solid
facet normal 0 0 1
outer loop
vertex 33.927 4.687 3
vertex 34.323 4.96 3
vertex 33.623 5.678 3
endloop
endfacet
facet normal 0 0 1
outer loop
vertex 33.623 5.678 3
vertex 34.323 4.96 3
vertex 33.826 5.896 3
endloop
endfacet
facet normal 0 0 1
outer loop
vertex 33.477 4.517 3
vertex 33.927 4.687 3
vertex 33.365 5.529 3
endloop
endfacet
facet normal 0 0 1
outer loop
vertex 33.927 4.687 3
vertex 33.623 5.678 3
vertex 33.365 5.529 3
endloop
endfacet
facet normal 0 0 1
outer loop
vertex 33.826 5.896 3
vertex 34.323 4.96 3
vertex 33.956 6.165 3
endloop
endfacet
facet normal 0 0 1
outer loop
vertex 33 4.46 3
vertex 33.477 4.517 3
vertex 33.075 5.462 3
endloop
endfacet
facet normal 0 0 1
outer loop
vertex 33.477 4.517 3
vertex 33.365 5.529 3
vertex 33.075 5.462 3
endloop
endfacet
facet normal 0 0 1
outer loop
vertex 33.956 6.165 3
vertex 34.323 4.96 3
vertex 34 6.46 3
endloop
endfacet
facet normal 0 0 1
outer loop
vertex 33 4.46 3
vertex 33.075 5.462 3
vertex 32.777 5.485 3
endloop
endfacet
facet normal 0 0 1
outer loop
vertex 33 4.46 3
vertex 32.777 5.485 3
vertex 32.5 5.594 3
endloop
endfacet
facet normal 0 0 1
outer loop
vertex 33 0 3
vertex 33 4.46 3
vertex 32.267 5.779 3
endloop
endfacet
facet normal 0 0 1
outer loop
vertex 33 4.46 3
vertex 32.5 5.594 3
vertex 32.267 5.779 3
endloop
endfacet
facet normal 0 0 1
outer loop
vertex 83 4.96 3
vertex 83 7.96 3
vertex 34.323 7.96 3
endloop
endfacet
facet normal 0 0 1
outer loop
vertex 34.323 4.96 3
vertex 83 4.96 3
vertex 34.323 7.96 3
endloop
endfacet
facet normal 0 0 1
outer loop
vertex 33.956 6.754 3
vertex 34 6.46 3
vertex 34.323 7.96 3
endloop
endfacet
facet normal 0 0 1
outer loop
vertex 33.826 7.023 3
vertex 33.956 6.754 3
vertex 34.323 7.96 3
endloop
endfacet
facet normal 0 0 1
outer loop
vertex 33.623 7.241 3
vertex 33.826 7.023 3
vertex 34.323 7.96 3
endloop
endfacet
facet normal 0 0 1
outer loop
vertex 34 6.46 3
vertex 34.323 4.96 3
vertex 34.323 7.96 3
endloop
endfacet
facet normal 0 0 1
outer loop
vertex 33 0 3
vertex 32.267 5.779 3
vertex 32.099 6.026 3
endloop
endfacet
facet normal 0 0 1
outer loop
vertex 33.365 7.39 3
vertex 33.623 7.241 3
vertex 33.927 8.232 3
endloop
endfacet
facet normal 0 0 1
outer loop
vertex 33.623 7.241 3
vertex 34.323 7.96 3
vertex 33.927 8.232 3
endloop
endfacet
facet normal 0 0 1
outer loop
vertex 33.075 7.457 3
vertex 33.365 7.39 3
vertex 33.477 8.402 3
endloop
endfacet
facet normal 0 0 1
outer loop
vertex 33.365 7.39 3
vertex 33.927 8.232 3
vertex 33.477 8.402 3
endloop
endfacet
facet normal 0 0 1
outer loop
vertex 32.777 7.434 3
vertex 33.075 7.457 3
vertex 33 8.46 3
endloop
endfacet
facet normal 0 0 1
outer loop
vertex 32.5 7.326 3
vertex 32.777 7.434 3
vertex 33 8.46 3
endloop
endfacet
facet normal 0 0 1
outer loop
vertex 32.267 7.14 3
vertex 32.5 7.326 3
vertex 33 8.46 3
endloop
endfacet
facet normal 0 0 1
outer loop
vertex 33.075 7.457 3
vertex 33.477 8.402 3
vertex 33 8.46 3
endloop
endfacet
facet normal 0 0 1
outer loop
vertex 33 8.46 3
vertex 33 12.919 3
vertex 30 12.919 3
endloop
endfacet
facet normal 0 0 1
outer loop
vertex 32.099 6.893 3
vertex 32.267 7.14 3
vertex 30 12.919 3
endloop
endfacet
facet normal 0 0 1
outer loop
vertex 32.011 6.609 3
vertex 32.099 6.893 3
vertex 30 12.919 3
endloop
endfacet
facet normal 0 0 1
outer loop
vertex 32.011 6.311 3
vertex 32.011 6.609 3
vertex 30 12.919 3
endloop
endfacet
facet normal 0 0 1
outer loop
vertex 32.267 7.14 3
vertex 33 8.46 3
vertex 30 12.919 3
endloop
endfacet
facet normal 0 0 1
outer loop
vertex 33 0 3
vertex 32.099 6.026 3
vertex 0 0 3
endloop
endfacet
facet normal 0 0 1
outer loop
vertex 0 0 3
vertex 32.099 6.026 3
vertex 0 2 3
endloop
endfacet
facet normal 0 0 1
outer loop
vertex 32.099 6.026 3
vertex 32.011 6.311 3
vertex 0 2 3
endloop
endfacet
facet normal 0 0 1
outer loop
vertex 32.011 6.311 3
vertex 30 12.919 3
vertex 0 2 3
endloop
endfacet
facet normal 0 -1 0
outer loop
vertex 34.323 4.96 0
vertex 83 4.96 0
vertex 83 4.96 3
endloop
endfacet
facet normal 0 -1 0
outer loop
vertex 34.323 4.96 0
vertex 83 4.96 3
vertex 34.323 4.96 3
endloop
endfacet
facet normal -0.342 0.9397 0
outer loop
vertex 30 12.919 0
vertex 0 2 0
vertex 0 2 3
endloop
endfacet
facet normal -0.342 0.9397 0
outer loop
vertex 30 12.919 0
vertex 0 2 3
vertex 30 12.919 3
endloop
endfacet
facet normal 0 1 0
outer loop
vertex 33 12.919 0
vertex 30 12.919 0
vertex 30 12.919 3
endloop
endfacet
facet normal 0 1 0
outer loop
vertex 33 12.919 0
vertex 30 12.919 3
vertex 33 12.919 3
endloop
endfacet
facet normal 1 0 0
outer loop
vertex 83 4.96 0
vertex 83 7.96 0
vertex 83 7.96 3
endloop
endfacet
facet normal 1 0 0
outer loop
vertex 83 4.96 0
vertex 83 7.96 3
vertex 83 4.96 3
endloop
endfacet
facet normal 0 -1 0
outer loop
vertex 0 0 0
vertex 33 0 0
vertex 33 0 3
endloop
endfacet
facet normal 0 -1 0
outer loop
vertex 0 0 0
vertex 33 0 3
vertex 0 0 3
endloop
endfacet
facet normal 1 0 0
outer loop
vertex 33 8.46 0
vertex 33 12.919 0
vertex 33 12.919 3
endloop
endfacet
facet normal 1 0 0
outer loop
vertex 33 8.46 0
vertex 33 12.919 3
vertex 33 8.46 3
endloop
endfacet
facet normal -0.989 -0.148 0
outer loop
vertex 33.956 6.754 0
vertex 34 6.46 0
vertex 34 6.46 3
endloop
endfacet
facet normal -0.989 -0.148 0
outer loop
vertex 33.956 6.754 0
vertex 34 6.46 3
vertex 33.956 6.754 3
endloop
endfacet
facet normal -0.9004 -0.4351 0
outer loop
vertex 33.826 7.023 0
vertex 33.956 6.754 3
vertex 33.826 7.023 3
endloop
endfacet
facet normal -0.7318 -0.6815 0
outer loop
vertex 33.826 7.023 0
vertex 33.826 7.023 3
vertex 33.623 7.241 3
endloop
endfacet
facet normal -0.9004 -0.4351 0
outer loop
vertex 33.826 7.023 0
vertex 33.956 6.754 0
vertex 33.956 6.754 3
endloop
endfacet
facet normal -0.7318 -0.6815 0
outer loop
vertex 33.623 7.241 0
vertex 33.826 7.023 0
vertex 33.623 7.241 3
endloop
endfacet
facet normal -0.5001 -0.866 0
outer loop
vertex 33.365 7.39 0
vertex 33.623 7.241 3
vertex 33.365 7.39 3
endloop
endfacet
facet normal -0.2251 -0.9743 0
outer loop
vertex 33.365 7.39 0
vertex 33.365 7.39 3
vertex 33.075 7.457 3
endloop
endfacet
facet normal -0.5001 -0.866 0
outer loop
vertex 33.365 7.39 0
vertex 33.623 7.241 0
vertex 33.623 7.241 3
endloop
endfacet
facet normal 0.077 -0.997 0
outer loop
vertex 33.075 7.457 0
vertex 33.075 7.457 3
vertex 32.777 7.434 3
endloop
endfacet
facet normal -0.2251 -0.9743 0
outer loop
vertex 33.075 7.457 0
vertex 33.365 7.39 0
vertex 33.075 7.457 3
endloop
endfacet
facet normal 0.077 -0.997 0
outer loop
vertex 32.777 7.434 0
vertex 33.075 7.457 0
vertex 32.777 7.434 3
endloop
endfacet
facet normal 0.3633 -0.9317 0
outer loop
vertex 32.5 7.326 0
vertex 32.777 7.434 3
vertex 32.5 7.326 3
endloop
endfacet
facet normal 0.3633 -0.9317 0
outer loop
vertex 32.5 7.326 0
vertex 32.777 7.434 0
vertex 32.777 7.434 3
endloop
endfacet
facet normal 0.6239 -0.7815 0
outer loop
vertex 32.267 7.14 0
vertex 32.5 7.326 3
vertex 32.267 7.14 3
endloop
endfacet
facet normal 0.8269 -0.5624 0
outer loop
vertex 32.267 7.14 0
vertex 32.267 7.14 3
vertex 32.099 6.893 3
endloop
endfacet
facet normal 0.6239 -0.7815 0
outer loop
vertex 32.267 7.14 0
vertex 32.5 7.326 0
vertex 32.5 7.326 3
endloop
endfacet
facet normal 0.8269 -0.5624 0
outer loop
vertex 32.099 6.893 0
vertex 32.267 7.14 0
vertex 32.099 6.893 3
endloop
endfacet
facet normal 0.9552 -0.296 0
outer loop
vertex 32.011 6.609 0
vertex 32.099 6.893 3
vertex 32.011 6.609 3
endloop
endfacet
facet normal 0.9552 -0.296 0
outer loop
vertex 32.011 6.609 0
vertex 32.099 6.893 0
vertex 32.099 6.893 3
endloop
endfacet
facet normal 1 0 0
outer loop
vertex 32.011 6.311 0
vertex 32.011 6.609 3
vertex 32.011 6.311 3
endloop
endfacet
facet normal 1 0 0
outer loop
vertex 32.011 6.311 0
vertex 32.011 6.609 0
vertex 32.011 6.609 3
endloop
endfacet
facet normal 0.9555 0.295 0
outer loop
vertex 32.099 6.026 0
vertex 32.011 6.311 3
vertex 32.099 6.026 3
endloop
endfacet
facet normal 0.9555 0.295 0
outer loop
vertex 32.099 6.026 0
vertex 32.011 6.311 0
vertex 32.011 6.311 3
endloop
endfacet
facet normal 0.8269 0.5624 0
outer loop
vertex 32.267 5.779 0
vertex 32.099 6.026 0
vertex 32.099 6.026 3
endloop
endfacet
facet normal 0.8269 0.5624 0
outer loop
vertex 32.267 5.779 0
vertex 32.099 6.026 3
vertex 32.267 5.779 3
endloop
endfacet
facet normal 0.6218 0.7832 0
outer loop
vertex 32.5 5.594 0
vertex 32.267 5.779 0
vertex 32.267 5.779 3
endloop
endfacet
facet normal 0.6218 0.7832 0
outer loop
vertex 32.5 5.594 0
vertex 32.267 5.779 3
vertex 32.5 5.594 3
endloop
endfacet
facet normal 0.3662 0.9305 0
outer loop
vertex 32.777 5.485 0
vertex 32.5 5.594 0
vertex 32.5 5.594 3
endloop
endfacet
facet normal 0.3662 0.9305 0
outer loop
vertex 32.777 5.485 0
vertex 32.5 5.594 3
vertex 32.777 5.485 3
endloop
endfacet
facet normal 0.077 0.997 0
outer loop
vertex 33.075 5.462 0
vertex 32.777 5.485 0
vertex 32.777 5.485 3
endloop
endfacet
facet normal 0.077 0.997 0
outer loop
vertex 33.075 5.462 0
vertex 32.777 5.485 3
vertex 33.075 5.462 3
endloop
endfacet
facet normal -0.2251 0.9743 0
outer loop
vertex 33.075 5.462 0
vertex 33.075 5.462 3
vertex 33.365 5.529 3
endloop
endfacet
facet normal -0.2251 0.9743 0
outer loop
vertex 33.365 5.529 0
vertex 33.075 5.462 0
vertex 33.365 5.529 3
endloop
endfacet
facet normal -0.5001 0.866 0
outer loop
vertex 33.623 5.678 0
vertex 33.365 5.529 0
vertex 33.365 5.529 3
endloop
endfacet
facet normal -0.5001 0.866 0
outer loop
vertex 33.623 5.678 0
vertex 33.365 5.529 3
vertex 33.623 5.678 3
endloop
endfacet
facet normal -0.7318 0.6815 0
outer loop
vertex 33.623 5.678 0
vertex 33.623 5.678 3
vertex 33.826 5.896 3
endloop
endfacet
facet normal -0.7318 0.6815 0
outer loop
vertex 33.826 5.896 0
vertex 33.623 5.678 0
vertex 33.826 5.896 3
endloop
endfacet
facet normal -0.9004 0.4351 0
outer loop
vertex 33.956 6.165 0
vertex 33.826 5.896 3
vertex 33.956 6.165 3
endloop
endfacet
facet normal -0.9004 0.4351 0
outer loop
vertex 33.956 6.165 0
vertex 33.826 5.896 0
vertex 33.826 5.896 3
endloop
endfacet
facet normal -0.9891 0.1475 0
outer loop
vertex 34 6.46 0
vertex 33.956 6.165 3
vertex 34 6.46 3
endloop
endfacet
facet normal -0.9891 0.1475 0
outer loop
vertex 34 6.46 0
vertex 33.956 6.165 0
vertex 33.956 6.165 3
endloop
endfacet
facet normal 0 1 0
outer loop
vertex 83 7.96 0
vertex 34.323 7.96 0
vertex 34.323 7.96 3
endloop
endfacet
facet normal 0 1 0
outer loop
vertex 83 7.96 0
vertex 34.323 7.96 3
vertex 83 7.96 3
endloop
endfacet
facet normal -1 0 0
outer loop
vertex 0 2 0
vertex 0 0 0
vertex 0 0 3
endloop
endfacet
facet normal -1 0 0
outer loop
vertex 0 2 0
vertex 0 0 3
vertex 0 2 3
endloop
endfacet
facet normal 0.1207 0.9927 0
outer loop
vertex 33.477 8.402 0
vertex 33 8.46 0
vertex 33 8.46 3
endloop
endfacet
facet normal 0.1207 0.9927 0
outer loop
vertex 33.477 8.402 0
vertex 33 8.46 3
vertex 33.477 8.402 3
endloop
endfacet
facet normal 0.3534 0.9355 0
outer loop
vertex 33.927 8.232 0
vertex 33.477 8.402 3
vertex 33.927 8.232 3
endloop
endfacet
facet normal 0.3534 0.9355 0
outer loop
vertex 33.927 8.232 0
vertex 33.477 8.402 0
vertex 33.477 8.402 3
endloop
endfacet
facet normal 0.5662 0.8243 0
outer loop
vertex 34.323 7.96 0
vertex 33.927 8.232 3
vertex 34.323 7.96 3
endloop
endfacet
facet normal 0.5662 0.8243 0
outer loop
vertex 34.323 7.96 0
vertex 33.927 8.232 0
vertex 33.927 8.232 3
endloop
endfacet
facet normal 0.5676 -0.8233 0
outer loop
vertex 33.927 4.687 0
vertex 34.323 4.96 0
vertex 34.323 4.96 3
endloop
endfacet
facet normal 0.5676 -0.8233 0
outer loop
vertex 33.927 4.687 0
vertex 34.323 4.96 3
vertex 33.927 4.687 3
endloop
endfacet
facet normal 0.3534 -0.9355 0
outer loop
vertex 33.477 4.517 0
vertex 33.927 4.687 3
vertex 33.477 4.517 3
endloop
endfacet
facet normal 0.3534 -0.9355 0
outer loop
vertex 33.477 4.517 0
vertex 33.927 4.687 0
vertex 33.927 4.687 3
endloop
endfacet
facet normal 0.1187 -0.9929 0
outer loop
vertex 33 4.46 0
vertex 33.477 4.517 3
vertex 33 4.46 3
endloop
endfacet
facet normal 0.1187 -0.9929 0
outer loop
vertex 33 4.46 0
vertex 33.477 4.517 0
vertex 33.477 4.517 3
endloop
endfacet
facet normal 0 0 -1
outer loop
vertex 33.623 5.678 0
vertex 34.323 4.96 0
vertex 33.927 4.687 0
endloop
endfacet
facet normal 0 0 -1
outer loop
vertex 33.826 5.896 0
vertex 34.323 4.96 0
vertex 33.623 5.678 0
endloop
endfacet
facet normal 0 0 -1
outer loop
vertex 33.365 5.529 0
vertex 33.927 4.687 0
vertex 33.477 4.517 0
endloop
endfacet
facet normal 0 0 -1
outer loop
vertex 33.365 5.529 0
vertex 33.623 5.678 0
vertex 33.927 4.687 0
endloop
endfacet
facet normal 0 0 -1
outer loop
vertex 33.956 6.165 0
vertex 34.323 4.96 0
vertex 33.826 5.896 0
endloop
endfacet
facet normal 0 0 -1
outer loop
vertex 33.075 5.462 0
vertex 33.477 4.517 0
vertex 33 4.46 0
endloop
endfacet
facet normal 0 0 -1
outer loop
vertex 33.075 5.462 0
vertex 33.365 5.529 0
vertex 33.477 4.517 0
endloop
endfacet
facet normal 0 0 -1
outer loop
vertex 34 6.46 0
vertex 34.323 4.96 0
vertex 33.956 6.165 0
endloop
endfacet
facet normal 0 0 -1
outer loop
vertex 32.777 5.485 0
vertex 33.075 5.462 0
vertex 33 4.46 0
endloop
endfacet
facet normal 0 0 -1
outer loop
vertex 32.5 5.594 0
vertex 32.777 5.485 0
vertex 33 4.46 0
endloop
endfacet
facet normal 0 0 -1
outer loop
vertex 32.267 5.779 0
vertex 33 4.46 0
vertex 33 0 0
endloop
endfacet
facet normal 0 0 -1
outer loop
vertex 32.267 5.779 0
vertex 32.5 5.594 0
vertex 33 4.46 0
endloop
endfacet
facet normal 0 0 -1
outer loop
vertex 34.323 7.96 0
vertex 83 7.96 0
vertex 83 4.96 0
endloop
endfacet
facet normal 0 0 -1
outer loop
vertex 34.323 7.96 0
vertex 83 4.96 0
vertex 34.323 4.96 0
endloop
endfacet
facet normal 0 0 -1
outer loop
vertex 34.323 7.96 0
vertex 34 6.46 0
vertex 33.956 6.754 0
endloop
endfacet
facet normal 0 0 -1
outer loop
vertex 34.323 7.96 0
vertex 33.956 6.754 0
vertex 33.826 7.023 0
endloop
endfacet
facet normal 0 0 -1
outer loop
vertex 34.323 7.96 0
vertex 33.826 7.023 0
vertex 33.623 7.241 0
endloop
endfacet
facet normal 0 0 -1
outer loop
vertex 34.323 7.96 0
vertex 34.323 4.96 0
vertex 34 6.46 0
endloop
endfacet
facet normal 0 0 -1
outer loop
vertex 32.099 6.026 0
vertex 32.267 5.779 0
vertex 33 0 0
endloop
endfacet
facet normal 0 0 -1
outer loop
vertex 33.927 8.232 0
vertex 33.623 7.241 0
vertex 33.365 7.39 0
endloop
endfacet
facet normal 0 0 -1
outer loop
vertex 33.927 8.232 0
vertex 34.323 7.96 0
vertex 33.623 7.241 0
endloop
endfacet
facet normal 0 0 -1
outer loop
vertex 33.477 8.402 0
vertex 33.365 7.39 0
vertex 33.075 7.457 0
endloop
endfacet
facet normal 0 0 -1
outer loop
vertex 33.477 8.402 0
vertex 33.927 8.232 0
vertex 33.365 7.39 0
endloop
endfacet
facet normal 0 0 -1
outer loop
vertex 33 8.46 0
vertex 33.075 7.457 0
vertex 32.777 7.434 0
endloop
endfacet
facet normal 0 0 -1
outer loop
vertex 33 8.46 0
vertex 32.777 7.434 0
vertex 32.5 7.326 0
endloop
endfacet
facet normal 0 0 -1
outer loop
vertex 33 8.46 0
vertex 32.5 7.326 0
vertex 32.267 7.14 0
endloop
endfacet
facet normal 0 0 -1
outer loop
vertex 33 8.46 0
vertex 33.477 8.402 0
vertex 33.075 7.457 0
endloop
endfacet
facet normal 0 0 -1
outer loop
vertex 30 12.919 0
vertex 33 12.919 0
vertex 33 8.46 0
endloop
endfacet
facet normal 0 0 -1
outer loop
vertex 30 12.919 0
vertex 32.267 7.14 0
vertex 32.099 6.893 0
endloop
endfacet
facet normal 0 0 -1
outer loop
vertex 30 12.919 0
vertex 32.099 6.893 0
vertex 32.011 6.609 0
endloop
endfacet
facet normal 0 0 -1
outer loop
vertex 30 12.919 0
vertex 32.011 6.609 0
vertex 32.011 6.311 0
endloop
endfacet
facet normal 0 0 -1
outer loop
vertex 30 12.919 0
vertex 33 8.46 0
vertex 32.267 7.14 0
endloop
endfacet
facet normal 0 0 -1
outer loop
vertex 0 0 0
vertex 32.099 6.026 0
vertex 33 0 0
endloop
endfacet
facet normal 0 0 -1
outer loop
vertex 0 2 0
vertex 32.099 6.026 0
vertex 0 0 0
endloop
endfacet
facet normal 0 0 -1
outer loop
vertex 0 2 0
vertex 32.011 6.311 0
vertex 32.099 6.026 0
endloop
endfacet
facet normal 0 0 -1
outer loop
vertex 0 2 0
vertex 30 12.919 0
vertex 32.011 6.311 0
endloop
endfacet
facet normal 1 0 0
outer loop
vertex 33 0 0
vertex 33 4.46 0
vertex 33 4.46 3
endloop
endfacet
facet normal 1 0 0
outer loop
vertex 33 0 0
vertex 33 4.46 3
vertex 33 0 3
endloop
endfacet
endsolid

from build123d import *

# Parameters (mm, degrees)
SKETCH_1_R      = 1
EXTRUDE_1_DEPTH = 3


with BuildPart() as part:
    # Эскиз1 → Бобышка-Вытянуть1 (new body)
    with BuildSketch(Plane.XY):
        with BuildLine():
            Line((0, 0), (0, 2))
            Line((0, 2), (30, 12.919107028))
            Line((30, 12.919107028), (33, 12.919107028))
            Line((33, 12.919107028), (33, 8.459553514))
            ThreePointArc((33, 8.459553514), (33.707106781, 8.330382207), (34.322875656, 7.959553514))
            Line((34.322875656, 7.959553514), (83, 7.959553514))
            Line((83, 7.959553514), (83, 4.959553514))
            Line((83, 4.959553514), (34.322875656, 4.959553514))
            ThreePointArc((34.322875656, 4.959553514), (33.707106781, 4.588724821), (33, 4.459553514))
            Line((33, 4.459553514), (33, 0))
            Line((33, 0), (0, 0))
        make_face()
        with Locations((33, 6.459553514)):
            Circle(SKETCH_1_R, mode=Mode.SUBTRACT)
    extrude(amount=EXTRUDE_1_DEPTH)


solid = part.part
